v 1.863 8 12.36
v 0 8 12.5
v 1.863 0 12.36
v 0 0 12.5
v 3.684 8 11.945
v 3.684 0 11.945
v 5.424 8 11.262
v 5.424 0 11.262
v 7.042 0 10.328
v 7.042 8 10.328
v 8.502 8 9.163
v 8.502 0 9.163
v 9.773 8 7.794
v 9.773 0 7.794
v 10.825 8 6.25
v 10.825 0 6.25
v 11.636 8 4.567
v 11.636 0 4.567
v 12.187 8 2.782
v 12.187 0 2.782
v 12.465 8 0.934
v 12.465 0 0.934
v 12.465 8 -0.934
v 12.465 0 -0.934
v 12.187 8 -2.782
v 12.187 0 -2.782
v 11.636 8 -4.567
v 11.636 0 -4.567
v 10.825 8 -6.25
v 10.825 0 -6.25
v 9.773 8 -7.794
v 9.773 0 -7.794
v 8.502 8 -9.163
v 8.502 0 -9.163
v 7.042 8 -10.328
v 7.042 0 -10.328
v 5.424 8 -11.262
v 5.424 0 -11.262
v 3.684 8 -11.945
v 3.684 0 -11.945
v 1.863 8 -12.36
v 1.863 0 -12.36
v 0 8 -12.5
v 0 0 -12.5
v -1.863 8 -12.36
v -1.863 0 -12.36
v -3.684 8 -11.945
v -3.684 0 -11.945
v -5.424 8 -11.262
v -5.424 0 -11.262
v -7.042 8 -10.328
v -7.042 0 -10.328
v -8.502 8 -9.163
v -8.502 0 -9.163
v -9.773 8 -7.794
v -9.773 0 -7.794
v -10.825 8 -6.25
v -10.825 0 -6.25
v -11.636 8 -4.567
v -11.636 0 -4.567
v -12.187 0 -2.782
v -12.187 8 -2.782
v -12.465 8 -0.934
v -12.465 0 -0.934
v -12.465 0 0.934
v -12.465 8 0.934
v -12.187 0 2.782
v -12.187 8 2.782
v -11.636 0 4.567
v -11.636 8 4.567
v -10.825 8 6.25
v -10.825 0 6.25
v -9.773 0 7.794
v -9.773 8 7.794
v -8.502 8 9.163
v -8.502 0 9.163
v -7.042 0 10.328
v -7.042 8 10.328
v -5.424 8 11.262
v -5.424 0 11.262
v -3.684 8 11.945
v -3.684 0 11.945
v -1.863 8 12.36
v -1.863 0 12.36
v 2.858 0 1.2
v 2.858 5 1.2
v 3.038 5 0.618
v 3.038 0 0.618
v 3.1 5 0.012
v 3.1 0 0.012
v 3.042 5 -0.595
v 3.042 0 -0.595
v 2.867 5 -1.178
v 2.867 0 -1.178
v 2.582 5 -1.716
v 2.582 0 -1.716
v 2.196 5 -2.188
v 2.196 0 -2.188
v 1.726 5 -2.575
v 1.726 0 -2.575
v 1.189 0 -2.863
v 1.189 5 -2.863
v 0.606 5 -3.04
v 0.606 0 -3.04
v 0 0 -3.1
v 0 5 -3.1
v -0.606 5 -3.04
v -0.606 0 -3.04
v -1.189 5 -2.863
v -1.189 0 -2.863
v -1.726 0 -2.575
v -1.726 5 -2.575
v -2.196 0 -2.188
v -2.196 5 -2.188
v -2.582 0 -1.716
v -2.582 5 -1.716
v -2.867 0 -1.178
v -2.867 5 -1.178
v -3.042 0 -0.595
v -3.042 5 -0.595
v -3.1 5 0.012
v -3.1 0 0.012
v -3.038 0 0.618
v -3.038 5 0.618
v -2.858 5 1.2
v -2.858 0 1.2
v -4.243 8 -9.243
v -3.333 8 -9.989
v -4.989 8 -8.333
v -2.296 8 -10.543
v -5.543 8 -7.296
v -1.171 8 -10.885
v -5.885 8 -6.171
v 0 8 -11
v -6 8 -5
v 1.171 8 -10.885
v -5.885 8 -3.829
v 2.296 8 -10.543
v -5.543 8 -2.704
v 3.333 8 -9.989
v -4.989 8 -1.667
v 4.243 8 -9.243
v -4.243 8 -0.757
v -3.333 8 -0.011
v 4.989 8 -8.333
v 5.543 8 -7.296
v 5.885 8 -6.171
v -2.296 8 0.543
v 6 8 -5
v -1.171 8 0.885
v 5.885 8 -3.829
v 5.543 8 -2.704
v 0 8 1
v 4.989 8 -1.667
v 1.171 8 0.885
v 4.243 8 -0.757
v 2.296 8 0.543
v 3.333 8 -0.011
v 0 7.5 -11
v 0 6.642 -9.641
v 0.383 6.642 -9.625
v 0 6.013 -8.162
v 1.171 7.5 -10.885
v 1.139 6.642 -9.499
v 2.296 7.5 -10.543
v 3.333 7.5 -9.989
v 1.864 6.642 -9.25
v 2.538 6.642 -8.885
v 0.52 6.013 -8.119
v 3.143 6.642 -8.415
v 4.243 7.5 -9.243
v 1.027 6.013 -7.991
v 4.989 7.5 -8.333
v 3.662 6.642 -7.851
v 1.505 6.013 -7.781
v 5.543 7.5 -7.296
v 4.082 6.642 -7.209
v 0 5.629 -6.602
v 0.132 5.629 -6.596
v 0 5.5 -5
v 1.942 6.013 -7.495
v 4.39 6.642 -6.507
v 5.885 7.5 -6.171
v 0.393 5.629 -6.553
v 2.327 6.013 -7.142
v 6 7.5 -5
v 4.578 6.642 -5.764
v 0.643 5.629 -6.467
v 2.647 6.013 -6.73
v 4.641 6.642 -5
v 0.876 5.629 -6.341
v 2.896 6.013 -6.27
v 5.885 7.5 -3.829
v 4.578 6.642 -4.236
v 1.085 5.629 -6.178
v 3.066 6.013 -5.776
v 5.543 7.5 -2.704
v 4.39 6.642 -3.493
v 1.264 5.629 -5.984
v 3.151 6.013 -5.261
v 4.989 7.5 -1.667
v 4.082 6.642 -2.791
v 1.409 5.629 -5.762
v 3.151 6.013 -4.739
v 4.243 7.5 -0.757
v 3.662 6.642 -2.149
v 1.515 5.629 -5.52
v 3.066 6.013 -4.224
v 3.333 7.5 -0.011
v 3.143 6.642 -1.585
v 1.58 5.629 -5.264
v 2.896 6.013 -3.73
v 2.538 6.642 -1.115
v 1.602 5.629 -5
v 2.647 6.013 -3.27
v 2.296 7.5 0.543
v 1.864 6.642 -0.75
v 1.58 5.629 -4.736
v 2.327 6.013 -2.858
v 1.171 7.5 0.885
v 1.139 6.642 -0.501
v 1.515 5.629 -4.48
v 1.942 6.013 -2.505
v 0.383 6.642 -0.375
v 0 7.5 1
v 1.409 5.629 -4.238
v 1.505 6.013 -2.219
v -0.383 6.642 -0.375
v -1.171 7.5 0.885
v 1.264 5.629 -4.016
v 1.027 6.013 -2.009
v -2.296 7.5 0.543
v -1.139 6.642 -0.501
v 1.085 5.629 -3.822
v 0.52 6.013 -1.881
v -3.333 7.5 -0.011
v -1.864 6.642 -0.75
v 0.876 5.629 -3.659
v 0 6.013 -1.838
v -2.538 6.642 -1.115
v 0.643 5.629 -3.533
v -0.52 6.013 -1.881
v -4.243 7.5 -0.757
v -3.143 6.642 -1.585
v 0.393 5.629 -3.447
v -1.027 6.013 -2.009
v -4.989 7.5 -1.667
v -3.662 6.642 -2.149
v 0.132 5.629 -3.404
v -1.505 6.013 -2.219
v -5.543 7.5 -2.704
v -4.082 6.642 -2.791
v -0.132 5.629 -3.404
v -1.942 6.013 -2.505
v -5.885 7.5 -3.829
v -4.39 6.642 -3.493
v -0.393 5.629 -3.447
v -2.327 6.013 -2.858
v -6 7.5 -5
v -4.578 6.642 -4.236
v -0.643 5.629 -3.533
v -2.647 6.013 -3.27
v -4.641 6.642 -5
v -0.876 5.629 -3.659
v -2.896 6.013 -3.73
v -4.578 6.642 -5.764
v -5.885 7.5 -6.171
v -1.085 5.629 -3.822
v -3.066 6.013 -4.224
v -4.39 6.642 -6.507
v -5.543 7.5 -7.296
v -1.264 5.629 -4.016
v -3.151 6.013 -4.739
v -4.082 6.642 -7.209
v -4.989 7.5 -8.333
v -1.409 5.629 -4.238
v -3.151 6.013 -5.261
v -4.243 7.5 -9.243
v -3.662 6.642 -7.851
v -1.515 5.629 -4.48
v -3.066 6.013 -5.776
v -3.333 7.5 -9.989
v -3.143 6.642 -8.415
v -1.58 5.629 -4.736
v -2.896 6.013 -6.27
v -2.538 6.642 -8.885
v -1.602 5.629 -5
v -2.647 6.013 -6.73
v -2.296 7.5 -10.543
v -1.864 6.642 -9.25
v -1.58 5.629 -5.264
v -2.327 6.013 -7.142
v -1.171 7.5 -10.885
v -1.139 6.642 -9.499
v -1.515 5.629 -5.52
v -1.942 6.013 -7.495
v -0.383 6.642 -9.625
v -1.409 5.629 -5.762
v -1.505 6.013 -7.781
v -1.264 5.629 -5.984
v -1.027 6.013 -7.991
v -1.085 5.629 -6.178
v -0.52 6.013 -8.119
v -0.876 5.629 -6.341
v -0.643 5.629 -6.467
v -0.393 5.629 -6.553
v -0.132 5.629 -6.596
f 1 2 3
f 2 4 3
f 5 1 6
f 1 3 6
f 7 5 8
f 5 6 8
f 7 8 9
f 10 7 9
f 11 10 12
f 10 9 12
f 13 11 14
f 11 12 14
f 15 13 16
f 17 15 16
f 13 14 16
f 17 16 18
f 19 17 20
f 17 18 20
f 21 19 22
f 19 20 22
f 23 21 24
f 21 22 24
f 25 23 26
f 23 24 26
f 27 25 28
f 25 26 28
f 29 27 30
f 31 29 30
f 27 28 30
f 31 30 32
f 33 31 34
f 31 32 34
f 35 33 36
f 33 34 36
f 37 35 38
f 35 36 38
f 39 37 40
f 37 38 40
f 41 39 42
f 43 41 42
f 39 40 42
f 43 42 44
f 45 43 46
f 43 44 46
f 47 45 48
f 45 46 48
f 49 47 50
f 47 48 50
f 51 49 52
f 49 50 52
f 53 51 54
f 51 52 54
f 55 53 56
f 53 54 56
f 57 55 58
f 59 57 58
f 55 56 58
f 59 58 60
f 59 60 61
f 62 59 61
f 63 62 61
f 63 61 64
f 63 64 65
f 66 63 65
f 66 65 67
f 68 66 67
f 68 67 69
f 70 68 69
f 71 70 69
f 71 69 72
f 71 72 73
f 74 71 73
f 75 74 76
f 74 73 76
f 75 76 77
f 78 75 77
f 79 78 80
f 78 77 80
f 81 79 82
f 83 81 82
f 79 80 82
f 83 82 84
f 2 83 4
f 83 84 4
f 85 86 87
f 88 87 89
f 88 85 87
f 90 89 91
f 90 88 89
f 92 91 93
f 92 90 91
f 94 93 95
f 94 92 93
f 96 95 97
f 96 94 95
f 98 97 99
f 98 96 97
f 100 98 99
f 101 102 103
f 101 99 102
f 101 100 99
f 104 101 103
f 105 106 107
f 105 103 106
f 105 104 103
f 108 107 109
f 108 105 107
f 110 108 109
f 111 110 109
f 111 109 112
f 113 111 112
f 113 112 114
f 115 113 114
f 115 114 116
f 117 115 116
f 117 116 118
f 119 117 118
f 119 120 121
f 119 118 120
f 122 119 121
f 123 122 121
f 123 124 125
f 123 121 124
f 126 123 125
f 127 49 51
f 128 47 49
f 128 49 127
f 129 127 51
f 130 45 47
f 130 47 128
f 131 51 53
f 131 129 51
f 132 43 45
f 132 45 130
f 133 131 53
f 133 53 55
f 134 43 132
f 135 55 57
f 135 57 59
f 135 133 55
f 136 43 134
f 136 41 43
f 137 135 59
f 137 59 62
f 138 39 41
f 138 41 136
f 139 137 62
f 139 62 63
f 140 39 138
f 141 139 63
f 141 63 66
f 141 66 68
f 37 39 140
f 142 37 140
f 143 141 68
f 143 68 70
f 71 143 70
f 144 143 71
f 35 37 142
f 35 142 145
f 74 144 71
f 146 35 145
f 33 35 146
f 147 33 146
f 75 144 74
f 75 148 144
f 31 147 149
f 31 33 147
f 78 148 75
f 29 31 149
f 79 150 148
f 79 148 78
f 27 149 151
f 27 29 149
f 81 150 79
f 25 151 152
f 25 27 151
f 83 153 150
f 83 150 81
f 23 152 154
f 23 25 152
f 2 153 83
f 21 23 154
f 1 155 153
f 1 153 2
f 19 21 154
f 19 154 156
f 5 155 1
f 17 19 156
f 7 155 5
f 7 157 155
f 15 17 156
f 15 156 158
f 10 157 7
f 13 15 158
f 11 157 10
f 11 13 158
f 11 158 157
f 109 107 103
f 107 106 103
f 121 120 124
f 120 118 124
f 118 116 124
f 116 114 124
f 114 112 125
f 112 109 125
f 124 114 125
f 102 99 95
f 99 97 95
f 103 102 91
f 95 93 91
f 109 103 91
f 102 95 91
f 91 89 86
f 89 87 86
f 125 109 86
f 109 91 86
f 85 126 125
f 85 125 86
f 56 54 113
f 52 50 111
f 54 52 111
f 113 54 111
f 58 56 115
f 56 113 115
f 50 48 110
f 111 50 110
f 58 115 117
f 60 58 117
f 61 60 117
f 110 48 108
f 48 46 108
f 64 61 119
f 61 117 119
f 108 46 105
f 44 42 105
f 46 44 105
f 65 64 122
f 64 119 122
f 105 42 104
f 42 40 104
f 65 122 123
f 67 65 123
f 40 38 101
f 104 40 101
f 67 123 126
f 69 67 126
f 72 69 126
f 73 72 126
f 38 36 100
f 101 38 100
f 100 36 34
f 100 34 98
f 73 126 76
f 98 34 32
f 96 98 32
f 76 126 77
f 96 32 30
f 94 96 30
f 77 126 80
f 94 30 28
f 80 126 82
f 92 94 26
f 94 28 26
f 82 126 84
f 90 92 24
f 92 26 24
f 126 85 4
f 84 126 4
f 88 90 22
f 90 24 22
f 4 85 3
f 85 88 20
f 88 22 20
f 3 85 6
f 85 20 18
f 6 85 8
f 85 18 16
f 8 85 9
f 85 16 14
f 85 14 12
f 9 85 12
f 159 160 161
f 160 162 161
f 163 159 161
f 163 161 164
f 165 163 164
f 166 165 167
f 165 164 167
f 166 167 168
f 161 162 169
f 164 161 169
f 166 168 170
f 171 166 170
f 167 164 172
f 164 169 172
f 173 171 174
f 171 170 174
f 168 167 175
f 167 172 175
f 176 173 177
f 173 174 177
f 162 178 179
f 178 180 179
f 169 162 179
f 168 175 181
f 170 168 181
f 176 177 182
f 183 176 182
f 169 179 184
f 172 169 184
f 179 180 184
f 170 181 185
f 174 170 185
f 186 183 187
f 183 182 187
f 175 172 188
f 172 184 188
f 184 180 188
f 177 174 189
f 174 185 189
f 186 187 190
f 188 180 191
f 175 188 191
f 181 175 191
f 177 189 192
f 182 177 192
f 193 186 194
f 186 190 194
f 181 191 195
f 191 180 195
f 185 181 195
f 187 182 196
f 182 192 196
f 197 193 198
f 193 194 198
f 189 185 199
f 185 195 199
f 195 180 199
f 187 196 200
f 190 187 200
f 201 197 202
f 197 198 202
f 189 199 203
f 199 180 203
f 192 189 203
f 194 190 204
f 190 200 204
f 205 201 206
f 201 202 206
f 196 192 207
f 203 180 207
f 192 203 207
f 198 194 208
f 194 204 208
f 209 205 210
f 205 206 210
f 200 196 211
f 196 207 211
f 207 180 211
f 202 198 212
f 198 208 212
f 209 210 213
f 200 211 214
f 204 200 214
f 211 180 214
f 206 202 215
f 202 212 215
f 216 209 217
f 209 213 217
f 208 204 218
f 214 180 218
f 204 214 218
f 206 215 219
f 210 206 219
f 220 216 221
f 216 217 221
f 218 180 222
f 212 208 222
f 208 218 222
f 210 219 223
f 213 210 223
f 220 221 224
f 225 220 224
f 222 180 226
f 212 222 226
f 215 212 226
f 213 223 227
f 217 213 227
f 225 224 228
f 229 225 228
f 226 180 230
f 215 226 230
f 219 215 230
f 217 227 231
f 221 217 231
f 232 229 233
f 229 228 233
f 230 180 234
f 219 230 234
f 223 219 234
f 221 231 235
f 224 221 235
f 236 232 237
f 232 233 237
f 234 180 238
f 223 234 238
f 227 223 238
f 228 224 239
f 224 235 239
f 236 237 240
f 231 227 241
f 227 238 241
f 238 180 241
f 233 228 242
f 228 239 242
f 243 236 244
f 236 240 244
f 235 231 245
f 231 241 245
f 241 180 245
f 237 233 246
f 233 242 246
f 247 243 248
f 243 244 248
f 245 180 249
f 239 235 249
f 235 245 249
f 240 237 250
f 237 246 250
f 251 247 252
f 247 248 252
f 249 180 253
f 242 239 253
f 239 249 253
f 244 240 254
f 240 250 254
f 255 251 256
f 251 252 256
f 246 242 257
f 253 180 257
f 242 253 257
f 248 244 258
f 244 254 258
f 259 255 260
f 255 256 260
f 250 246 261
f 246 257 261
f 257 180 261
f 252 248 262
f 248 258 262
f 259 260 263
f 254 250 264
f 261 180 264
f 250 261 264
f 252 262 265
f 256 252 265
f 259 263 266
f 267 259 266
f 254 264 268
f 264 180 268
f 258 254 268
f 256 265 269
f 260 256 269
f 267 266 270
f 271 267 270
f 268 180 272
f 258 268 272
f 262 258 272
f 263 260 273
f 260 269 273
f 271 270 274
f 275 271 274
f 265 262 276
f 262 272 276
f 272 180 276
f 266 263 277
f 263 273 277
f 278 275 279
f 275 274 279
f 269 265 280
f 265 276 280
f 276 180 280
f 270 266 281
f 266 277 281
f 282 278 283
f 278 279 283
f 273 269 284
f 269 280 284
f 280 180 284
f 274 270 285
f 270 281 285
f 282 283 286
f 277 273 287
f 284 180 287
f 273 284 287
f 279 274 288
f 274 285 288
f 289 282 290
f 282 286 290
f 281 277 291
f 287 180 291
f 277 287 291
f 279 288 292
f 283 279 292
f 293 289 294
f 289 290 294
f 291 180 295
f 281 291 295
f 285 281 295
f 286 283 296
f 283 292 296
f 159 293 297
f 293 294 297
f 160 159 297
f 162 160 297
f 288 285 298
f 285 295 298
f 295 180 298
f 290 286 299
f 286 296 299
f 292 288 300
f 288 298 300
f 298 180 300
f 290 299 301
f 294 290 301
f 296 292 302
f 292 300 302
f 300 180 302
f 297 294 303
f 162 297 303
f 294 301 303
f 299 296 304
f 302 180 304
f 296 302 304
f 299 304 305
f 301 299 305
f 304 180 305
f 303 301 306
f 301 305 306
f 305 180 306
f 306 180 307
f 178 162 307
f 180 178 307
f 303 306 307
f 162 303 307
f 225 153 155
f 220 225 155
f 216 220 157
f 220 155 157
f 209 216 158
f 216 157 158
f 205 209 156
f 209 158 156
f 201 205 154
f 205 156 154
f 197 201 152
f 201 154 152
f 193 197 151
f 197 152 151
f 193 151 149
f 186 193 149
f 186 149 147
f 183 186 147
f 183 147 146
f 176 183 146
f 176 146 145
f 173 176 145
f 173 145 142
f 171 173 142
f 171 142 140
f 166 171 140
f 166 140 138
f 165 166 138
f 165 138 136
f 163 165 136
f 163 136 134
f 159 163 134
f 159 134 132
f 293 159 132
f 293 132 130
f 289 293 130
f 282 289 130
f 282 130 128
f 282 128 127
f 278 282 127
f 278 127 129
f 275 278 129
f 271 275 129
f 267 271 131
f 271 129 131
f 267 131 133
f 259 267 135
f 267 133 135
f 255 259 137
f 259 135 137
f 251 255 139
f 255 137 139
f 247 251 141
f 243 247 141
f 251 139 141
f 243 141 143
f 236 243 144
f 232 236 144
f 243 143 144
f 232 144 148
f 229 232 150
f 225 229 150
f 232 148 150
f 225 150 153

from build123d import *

# Parameters (mm, degrees)
SKETCH1_R           = 12.5
BOSS_EXTRUDE1_DEPTH = 8
BOSS_EXTRUDE2_START = -3
SKETCH2_R           = 12.5
BOSS_EXTRUDE2_DEPTH = 3
SKETCH3_R           = 6
CUT_EXTRUDE1_DEPTH  = 0.5
DOME1_FACE_RADIUS   = 6
DOME1_HEIGHT        = 2


with BuildPart() as part:
    # Sketch1 → Boss-Extrude1 (new body)
    with BuildSketch(Plane(origin=(0, 0, 0), x_dir=(1, 0, 0), z_dir=(0, 1, 0))):
        with Locations(Location((0, 0, 0), (0, 0, 270))):
            Circle(SKETCH1_R)
        with BuildLine():
            Line((-2.858321186, -1.2), (2.858321186, -1.2))
            ThreePointArc((2.858321186, -1.2), (0, 3.1), (-2.858321186, -1.2))
        make_face(mode=Mode.SUBTRACT)
    extrude(amount=BOSS_EXTRUDE1_DEPTH)

    # Sketch2 → Boss-Extrude2 (add)
    with BuildSketch(Plane(origin=(0, 8, 0), x_dir=(1, 0, 0), z_dir=(0, 1, 0)).offset(BOSS_EXTRUDE2_START)):
        with Locations(Location((0, 0, 0), (0, 0, 270))):
            Circle(SKETCH2_R)
    extrude(amount=BOSS_EXTRUDE2_DEPTH)

    # Sketch3 → Cut-Extrude1 (cut)
    with BuildSketch(Plane(origin=(0, 8, 0), x_dir=(1, 0, 0), z_dir=(0, 1, 0))):
        with Locations(Location((0, 5, 0), (0, 0, 270))):
            Circle(SKETCH3_R)
    extrude(amount=-CUT_EXTRUDE1_DEPTH, mode=Mode.SUBTRACT)

    # Dome1: a dome of height H over a round flat face of radius A is a cap of a sphere of radius (A * A + H * H) / (2 * H)
    dome1_r = (DOME1_FACE_RADIUS * DOME1_FACE_RADIUS + DOME1_HEIGHT * DOME1_HEIGHT) / (2 * DOME1_HEIGHT)
    dome1_base = Plane((0, 7.5, -5), z_dir=(0, -1, 0))
    with Locations(dome1_base.offset(DOME1_HEIGHT - dome1_r)):
        dome1_ball = Sphere(dome1_r, mode=Mode.PRIVATE)
    add(split(dome1_ball, bisect_by=dome1_base, keep=Keep.TOP, mode=Mode.PRIVATE), mode=Mode.SUBTRACT)


solid = part.part
